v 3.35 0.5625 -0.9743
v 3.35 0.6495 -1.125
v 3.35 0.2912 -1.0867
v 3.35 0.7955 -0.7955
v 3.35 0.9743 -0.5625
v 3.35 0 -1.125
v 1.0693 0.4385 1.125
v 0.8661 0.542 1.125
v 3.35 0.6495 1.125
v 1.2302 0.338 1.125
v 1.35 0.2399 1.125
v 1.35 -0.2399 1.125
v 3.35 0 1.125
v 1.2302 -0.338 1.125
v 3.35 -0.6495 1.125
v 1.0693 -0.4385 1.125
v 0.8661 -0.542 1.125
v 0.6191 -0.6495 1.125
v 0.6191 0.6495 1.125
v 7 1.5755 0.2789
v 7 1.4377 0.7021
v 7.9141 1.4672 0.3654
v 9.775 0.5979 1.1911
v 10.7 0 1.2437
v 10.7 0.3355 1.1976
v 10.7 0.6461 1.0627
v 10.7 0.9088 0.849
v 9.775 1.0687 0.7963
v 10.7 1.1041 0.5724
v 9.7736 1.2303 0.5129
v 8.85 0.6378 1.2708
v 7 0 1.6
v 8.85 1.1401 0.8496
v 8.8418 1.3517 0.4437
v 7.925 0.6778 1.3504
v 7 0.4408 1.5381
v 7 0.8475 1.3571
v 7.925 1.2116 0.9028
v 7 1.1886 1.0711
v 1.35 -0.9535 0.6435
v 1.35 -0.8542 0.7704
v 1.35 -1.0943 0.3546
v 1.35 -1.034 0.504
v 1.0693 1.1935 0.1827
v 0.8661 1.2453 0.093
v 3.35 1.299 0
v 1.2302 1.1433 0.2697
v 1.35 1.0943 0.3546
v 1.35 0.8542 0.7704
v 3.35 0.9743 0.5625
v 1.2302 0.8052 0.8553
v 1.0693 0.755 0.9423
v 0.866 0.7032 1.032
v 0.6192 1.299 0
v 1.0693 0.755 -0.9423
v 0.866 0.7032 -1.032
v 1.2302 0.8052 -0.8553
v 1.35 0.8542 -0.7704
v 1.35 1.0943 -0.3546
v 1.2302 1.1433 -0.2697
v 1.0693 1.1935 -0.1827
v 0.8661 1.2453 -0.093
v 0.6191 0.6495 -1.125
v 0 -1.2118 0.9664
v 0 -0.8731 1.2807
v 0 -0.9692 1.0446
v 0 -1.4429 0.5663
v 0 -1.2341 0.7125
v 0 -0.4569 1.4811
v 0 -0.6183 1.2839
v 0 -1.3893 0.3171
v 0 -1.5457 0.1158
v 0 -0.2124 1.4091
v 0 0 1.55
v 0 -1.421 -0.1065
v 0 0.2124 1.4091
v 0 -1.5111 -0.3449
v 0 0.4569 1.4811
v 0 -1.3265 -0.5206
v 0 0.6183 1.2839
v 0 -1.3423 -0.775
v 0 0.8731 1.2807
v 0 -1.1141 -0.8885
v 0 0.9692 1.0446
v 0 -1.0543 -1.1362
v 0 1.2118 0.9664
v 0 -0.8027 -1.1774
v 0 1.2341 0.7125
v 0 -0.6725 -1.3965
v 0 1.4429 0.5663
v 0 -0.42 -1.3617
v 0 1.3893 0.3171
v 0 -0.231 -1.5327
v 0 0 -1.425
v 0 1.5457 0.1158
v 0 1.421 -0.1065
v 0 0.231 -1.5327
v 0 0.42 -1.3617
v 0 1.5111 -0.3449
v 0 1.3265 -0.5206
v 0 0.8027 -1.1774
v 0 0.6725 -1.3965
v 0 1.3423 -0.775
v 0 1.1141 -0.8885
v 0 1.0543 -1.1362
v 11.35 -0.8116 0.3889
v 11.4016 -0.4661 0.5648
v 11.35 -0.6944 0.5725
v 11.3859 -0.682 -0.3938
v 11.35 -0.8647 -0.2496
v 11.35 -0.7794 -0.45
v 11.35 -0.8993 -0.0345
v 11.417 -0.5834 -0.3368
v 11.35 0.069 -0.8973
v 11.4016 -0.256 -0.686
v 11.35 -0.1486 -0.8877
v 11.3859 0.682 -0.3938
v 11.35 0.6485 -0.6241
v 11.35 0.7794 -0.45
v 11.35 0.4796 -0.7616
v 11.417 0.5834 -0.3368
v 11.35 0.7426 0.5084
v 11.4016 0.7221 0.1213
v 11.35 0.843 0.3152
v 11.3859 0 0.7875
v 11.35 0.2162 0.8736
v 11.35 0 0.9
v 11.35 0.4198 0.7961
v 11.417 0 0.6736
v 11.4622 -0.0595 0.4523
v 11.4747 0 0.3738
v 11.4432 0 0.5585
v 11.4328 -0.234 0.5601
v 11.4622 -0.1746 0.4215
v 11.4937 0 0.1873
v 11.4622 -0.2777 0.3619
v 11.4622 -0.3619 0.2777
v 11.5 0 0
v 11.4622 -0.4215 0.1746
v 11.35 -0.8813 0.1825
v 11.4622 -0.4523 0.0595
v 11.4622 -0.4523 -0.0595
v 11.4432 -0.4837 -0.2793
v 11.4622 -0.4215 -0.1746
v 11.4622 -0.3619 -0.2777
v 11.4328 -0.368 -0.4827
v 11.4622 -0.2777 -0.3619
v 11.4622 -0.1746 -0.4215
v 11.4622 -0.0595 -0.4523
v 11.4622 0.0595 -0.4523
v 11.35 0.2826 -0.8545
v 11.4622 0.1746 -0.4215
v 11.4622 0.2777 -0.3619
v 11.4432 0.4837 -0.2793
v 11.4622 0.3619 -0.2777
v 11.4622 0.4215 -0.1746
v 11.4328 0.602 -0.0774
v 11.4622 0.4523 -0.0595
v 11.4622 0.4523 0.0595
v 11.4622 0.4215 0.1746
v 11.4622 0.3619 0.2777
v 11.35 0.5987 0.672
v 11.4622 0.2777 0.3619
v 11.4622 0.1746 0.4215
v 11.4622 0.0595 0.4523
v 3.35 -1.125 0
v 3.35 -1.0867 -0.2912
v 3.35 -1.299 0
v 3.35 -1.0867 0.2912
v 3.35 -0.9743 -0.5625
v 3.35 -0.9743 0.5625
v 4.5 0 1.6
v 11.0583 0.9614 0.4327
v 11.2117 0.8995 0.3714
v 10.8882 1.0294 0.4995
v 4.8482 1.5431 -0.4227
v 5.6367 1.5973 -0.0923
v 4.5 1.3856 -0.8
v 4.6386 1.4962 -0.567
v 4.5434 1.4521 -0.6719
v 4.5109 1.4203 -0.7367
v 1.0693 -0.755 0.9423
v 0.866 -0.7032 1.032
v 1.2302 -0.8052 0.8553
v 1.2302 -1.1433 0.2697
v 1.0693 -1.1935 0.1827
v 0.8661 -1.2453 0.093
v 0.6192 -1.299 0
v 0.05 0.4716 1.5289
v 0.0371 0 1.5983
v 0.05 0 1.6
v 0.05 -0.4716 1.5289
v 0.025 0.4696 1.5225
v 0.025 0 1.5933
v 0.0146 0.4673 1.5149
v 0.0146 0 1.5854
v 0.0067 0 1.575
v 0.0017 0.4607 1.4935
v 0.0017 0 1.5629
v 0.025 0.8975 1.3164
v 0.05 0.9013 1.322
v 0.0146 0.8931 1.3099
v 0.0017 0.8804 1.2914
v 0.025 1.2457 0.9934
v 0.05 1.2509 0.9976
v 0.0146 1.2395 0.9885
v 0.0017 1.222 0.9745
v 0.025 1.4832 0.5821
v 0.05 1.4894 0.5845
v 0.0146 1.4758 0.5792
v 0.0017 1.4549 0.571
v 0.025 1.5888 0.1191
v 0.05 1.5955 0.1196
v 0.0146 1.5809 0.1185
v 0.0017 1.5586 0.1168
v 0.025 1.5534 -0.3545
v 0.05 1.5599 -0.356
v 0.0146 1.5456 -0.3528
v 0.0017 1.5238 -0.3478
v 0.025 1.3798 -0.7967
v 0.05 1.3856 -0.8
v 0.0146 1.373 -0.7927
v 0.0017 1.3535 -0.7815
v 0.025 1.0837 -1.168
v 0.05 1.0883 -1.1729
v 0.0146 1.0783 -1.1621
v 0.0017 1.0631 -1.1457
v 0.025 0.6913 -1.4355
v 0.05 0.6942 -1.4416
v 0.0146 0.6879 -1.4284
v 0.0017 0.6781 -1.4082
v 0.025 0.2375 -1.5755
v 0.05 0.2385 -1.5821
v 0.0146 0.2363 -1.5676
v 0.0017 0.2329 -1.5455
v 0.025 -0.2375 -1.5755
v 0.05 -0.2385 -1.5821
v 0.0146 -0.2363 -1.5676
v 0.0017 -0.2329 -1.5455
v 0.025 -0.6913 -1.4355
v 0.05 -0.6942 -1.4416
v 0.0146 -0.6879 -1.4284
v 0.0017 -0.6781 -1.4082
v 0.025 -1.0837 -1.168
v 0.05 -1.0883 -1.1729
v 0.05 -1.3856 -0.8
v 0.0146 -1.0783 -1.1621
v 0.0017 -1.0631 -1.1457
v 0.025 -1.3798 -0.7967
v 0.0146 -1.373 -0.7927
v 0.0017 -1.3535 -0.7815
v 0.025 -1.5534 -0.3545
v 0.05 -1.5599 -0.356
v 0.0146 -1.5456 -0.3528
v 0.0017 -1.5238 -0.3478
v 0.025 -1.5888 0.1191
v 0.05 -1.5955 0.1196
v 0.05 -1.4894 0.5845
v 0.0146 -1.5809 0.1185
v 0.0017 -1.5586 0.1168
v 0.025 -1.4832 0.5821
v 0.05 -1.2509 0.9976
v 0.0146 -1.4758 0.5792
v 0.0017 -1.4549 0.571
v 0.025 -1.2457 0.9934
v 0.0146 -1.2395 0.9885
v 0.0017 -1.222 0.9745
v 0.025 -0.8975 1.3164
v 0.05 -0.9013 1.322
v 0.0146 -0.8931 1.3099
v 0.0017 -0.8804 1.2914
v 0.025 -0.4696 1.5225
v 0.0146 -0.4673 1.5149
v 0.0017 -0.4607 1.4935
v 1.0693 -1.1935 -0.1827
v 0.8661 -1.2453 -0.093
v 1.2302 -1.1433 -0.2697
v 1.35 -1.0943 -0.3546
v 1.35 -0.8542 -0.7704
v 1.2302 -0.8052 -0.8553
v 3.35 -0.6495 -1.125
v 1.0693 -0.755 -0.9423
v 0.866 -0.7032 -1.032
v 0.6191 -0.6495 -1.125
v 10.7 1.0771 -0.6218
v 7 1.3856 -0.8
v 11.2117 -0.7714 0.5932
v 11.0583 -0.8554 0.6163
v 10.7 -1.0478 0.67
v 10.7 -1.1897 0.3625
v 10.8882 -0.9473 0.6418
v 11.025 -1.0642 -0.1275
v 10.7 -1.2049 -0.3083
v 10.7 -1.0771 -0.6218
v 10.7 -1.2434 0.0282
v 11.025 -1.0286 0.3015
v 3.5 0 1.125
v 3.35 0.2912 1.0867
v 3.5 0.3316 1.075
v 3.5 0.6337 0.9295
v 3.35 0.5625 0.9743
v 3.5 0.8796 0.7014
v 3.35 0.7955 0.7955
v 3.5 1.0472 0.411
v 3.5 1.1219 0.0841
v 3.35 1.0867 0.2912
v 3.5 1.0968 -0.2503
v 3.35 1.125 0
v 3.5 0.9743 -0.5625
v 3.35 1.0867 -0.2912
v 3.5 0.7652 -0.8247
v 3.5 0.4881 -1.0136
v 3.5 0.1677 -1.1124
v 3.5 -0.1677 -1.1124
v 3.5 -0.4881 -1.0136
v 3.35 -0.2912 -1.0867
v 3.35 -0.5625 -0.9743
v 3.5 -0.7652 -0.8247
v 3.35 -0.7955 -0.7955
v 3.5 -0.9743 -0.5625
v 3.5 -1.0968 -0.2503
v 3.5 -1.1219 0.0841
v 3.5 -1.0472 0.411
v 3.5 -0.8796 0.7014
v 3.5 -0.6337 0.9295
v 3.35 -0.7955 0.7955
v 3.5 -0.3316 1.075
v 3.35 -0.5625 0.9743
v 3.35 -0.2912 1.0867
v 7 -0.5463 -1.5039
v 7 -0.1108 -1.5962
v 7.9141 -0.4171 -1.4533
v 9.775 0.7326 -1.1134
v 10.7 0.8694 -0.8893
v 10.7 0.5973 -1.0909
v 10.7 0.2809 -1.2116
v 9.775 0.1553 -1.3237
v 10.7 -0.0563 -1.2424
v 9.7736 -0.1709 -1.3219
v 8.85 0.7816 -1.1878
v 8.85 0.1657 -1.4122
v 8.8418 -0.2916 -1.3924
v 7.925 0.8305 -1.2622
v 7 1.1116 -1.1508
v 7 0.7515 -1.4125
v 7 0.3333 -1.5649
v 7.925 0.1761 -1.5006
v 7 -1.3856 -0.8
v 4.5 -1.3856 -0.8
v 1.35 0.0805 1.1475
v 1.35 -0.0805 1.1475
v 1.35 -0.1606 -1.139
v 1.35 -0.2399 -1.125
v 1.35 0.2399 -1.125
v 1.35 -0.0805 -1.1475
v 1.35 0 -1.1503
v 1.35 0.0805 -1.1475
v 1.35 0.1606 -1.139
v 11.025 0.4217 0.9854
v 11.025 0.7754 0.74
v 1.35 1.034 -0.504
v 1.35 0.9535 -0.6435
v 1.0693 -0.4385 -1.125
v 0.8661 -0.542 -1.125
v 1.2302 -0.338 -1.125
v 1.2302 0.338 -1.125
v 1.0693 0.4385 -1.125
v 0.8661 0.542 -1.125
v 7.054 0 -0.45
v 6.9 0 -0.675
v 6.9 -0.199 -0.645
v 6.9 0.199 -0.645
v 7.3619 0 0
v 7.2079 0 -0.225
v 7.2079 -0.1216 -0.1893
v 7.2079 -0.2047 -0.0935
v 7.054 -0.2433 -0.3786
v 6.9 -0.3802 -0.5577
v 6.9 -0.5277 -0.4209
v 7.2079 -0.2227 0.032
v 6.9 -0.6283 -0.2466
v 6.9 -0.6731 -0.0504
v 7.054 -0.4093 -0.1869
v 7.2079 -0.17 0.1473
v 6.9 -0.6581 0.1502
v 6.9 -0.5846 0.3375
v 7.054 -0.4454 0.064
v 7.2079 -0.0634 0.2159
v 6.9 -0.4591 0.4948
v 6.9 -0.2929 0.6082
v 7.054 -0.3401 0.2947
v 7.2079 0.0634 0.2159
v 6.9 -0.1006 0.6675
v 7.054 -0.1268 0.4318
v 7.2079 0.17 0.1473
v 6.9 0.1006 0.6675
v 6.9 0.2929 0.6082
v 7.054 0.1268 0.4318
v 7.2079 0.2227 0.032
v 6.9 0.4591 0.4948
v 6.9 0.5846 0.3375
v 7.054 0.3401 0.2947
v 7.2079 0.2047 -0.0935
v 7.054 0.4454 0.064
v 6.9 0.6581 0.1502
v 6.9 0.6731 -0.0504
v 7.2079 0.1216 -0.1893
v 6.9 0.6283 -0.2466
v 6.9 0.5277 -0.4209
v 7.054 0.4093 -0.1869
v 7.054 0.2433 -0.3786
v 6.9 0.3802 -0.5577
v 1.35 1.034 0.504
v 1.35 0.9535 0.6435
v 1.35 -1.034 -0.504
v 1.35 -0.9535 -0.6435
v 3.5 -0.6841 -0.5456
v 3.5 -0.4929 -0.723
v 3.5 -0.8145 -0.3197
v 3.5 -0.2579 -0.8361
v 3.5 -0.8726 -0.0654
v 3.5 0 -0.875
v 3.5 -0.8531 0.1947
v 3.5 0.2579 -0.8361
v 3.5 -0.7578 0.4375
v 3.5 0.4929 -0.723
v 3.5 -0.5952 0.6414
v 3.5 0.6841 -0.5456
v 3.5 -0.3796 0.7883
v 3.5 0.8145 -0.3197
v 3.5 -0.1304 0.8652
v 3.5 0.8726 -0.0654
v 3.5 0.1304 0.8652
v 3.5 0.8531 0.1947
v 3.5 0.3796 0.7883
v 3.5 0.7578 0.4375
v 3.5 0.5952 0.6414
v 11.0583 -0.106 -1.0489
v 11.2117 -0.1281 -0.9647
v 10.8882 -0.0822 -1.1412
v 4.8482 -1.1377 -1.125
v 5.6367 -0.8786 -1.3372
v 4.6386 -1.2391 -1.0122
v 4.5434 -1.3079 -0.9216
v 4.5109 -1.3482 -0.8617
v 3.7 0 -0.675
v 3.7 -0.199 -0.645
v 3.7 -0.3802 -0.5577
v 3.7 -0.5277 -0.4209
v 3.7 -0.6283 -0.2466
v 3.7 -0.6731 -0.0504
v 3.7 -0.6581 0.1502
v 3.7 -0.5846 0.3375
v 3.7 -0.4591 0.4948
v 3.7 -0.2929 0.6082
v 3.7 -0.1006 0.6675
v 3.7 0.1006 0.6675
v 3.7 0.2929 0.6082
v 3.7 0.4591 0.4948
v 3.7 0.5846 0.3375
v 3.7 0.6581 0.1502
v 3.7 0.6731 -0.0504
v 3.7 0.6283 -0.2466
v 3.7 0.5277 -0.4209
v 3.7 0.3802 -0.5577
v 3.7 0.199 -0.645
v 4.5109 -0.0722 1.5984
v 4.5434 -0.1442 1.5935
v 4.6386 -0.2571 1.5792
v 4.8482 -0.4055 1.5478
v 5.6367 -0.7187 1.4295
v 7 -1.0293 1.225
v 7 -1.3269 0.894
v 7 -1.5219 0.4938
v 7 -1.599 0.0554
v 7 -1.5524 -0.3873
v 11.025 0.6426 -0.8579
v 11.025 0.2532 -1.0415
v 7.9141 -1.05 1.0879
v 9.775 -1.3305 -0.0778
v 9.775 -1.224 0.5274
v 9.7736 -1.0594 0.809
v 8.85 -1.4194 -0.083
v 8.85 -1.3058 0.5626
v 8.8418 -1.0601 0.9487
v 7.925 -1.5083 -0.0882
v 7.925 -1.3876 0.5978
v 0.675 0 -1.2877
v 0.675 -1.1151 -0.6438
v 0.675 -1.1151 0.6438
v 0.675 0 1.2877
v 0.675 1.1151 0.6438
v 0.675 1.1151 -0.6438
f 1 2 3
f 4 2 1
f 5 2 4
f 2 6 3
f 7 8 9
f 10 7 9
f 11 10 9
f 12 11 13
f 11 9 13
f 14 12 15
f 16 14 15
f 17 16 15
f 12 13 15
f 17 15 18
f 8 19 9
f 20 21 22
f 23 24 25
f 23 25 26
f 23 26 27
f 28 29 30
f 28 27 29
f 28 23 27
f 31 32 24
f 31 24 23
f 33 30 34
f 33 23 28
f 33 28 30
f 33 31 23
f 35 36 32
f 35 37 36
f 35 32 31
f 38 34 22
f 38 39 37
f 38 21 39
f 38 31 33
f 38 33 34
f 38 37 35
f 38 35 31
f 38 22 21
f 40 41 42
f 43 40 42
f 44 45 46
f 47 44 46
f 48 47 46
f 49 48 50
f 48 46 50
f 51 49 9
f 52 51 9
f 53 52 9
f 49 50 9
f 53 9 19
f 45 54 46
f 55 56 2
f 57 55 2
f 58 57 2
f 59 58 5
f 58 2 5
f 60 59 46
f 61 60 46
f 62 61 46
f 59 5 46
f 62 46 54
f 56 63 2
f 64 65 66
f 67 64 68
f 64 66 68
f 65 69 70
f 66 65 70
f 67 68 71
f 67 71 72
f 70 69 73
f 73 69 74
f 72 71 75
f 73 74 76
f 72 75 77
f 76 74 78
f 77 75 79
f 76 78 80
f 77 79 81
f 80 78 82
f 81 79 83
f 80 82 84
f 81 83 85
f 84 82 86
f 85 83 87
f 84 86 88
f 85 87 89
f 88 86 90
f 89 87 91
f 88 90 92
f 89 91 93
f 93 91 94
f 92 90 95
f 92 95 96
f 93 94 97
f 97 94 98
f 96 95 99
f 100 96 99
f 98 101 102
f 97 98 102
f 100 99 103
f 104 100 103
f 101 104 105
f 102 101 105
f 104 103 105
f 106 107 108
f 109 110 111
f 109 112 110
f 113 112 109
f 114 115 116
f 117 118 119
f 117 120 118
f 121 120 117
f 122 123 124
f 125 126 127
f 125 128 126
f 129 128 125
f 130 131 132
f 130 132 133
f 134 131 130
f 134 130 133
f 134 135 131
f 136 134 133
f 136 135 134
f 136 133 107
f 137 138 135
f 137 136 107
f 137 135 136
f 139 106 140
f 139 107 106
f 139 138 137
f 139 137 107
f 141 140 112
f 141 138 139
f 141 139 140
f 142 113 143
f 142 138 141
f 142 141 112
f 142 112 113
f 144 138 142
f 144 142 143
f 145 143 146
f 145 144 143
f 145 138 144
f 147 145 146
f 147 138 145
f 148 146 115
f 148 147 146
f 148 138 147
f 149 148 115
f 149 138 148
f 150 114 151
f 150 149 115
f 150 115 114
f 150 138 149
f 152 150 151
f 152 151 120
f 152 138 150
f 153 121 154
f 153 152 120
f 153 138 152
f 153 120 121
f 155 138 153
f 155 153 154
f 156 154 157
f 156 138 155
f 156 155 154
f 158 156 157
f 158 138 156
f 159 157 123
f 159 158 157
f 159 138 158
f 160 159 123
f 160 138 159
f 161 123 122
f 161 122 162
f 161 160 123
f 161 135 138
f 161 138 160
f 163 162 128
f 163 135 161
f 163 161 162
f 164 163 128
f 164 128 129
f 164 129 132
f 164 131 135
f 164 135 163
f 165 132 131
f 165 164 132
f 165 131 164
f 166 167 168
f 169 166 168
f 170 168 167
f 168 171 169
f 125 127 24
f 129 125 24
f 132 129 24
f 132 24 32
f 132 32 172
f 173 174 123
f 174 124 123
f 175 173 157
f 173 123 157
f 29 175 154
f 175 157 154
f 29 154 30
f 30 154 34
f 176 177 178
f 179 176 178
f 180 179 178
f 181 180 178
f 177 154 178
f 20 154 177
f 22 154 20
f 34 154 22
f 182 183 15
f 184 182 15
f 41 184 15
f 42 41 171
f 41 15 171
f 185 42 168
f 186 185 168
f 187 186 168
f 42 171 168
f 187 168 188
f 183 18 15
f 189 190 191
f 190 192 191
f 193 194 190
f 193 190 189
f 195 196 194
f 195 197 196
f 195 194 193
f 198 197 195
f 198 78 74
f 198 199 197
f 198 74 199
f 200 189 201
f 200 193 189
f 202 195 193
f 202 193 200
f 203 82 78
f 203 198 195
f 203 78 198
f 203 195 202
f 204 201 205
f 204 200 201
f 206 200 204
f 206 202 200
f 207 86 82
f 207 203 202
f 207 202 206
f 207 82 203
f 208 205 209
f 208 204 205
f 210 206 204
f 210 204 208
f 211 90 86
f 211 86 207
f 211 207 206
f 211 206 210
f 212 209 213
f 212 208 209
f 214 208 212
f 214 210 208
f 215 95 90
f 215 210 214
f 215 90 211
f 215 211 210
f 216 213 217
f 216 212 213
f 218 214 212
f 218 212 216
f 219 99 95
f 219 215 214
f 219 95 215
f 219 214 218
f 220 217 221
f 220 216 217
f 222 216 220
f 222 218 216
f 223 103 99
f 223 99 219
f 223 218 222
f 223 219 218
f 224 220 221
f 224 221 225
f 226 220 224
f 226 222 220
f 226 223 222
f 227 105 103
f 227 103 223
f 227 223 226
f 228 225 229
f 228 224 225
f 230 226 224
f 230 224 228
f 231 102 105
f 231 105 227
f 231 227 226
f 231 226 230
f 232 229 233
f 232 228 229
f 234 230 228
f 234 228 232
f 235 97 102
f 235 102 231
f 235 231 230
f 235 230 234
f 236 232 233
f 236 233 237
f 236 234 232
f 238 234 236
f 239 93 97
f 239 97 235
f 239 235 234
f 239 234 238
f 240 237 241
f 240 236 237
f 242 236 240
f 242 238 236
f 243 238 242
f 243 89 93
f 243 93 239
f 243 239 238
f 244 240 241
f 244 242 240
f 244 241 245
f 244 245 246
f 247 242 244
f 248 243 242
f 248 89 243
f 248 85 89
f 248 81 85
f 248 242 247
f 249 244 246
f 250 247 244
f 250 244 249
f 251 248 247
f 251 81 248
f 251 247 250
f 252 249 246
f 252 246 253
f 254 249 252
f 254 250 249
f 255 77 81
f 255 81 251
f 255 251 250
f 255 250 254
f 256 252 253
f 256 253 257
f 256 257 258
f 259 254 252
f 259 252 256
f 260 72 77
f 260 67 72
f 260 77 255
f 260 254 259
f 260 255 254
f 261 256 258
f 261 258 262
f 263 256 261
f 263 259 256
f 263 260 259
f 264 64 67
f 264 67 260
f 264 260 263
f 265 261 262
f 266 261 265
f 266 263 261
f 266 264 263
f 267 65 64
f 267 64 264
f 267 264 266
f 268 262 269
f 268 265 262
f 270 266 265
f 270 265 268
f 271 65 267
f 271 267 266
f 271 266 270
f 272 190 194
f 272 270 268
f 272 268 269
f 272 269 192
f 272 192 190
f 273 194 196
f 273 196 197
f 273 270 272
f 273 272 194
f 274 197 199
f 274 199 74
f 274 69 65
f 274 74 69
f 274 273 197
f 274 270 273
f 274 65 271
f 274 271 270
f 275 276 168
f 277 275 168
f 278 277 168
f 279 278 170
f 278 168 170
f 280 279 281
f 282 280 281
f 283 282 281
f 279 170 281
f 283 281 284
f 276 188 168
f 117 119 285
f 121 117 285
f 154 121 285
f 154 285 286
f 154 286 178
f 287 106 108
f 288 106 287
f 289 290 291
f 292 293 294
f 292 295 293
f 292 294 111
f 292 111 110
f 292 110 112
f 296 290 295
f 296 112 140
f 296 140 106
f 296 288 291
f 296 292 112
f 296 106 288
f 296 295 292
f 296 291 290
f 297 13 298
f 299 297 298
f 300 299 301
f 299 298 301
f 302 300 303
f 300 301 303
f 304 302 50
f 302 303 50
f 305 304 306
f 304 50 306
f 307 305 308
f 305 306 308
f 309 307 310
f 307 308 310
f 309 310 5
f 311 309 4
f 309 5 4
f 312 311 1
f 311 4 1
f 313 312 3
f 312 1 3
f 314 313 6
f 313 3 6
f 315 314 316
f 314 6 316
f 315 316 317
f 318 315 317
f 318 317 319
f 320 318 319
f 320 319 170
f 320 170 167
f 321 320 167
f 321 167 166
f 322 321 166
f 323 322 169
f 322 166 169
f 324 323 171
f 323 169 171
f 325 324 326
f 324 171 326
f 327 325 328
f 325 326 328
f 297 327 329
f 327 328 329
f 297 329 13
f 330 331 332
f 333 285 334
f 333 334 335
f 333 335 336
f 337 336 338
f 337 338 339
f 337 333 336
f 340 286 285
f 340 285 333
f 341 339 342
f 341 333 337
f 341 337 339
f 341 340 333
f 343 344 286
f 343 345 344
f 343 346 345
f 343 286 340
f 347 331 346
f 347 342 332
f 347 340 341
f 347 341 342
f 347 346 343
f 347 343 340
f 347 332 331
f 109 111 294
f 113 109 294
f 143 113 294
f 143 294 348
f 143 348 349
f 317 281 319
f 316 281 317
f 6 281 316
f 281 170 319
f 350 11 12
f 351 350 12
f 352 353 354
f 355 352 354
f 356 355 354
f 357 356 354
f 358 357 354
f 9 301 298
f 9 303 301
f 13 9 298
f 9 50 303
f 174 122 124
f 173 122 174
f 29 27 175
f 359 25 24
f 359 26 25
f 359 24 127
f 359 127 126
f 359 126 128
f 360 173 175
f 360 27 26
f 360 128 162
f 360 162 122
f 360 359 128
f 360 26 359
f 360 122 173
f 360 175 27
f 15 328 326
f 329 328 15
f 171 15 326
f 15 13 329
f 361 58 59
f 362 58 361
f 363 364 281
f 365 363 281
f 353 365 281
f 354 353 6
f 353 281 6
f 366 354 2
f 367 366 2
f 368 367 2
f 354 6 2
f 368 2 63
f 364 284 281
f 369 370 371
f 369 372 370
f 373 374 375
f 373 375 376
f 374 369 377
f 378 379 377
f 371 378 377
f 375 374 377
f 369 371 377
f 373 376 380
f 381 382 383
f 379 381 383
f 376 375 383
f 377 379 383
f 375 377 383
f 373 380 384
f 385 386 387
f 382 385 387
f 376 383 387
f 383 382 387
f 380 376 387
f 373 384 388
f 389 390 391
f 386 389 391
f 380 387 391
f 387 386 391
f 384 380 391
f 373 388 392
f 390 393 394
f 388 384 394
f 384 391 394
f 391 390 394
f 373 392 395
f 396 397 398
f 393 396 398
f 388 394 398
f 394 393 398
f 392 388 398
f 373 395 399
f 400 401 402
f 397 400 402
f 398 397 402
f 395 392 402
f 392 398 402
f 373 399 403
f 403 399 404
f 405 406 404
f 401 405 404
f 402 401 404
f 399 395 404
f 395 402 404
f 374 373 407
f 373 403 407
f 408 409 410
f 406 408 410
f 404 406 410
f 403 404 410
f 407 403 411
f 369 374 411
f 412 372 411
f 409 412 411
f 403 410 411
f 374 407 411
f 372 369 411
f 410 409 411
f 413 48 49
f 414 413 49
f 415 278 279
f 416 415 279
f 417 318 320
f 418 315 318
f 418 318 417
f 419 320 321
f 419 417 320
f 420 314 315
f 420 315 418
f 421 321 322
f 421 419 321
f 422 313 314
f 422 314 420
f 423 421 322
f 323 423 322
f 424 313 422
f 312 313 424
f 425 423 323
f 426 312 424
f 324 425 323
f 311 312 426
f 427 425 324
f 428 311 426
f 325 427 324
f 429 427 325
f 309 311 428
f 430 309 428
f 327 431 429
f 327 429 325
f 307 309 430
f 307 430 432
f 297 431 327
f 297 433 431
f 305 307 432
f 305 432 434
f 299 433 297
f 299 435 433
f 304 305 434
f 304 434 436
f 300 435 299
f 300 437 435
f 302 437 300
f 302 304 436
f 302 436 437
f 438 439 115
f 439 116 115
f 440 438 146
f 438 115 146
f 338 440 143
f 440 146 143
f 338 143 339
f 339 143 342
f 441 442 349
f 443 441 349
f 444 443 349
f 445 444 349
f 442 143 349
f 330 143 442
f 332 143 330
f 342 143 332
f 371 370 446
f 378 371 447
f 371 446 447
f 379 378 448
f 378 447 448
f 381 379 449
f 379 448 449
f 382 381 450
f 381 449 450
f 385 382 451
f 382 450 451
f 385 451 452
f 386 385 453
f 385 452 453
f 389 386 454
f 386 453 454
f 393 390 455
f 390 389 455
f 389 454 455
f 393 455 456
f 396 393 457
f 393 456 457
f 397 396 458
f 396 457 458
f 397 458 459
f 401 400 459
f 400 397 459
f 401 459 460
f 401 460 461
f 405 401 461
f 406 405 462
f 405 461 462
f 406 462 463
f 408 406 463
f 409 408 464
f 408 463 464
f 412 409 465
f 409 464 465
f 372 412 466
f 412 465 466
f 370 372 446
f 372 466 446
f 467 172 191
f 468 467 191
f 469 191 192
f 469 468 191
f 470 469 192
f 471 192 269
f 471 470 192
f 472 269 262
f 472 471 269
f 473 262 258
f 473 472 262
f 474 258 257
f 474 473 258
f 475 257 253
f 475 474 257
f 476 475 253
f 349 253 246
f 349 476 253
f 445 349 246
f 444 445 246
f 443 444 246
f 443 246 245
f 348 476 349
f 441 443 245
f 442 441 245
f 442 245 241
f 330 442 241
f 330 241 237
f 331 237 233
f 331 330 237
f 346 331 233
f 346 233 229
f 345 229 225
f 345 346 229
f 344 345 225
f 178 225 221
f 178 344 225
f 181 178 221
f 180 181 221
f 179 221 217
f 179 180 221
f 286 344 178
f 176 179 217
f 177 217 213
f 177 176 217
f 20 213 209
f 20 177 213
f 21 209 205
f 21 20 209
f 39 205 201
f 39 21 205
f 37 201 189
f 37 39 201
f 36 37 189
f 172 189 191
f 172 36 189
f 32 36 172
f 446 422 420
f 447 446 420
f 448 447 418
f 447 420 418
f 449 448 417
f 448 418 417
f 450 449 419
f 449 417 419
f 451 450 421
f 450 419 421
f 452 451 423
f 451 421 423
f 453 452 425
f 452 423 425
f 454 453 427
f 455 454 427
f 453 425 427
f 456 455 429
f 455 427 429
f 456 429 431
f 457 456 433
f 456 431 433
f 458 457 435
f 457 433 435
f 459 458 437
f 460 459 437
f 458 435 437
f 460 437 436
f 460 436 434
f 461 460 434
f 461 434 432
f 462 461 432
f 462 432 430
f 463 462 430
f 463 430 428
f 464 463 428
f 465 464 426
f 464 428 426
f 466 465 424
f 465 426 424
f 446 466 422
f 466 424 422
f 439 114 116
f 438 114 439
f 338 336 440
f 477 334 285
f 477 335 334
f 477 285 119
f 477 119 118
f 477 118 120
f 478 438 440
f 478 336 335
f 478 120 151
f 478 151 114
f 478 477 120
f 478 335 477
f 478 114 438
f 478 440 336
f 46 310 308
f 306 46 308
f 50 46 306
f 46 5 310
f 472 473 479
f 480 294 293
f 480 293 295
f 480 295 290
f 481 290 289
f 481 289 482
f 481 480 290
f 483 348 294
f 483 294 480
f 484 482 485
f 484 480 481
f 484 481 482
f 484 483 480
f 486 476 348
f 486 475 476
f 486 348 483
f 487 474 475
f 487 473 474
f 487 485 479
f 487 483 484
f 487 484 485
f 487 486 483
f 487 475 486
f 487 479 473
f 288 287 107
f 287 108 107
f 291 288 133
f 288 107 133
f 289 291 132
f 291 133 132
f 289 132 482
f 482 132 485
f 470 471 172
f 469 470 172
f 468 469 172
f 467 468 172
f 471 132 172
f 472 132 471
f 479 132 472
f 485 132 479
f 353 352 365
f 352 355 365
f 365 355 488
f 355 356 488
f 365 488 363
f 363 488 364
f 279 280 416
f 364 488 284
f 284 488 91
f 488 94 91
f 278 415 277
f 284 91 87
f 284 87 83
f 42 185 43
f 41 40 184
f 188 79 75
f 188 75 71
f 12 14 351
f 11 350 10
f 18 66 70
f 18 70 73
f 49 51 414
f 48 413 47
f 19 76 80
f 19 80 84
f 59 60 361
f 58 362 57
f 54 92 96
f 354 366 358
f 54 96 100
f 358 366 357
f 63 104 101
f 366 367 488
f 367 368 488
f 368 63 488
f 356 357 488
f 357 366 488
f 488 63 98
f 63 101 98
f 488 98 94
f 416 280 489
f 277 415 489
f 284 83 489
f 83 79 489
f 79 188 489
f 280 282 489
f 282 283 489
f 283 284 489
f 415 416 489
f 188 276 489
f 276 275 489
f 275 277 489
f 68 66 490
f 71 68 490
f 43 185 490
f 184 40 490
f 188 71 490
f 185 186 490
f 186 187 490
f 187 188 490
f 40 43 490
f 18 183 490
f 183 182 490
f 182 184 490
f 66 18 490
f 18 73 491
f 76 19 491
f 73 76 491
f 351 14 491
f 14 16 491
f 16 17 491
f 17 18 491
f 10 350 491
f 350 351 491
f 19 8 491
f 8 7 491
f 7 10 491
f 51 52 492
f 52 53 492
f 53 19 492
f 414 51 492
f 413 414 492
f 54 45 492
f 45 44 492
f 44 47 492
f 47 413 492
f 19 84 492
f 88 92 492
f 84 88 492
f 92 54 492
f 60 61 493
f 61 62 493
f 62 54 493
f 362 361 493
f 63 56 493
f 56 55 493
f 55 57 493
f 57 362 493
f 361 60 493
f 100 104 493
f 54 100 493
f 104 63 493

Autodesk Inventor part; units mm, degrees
ref_plane "YZ Plane" through (0, 0, 0) normal (1, 0, 0) x (0, 1, 0)
ref_plane "XZ Plane" through (0, 0, 0) normal (0, 1, 0) x (-1, 0, 0)
ref_plane "XY Plane" through (0, 0, 0) normal (0, 0, 1) x (1, 0, 0)
sketch "Sketch1" plane through (0, 0, 0) normal (0, 1, 0) x (-1, 0, 0)
  line L0 (0, 0) -> (0, 1.6)
  line L1 (0, 1.6) -> (-7, 1.6)
  line L2 (-7, 1.6) -> (-10.7, 1.2437)
  line L3 (-11.2, 0.9793) -> (-11.2, 0)
  line L4 (-11.2, 0) -> (0, 0)
  arc A0 (-11.35, 0.9) -> (-11.5, 0) centre (-8.725, 0) ccw
  line L5 (-11.2, 0) -> (-11.5, 0)
  line L6 (-10.7, 0) -> (-10.7, 1.2437)
  line L7 (-10.7, 1.2437) -> (-11.35, 0.9)
  dimension "d0" = 1.6
  dimension "d1" = 7
  dimension "d3" = 11.2
  dimension "d4" = 0.3
  dimension "d352" = 0.8
  dimension "d353" = 0.9
  dimension "d355" = 0.65
  dimension "d359" = 5.5
revolve "Revolution1" add sketch "Sketch1" angle 360 about axis through (11.2, 0, 0) along (-1, 0, 0)
sketch "Sketch2" plane through (0, 0, 0) normal (0, 1, 0) x (-1, 0, 0)
  line L0 (0, -1.425) -> (0, 0)
  line L1 (0, 0) -> (-6.9, 0)
  line L2 (-6.9, 0) -> (-6.9, -0.675)
  line L3 (-6.9, -0.675) -> (-2.8, -0.675)
  line L4 (-2.8, -0.675) -> (-2.8, -1.1)
  line L5 (-2.8, -1.1) -> (-1.35, -1.1)
  line L6 (-1.35, -1.1) -> (-1.35, -1.1503)
  line L7 (-1.35, -1.1503) -> (0, -1.425)
  line L8 (-6.9, -0.675) -> (-7.3619, 0)
  line L9 (-7.3619, 0) -> (-6.9, 0) construction
  line L10 (-7.3619, 0) -> (-6.9, 0)
  line L11 (0, 0) -> (0, -1.425)
  line L12 (0, -1.6) -> (0, 1.6) projected
  line L13 (0, -1.425) -> (0, -1.425)
  dimension "d9" = 1.1
  dimension "d11" = 1.425
  dimension "d12" = 11.5
  dimension "d145" = 0.4619
  dimension "d284" = 1.45
  dimension "d293" = 1.35
  dimension "d361" = 1.425
  dimension "d363" = 0
  dimension "d367" = 6.9
  dimension "d373" = 0.675
revolve "Revolution2" cut sketch "Sketch2" angle 360 about axis through (0, 0, 0) along (1, 0, 0)
sketch "Sketch3" plane through (1.35, 0, 0) normal (-1, 0, 0) x (0, 0, 1)
  line L0 (0, 1.299) -> (1.125, 0.6495)
  line L1 (1.125, 0.6495) -> (1.125, -0.6495)
  line L2 (1.125, -0.6495) -> (0, -1.299)
  line L3 (0, -1.299) -> (-1.125, -0.6495)
  line L4 (-1.125, -0.6495) -> (-1.125, 0.6495)
  line L5 (-1.125, 0.6495) -> (0, 1.299)
  point P0 (0, 0)
  point P1 (0, 0)
  dimension "d20" = 0
  dimension "d21" = 2.25
extrude "Extrusion1" cut sketch "Sketch3" along normal blind 1.25 and the other way blind 2
fillet "Fillet1" radius 0.05 1 edges at (0, 0, -1.6)
sketch "Sketch10" plane through (0, 0, 0) normal (0, 1, 0) x (-1, 0, 0)
  circle A0 centre (-1.8, 1.5) radius 0.1
  line L0 (-0.5216, -1.4433) -> (-0.46, -1.55)
  line L1 (-0.46, -1.55) -> (-0.6332, -1.55)
  line L2 (-0.6332, -1.55) -> (-0.5716, -1.4433)
  line L3 (-0.5216, -1.4433) -> (-0.5716, -1.4433)
  line L4 (0, 1.55) -> (0, -1.55) projected
  point P0 (0, 0)
  point P1 (-0.5466, -1.5)
  point P2 (-0.5466, -1.4)
  dimension "d69" = 0.2
  dimension "d70" = 1.5
  dimension "d71" = 1.8
  dimension "d232" = 0.15
  dimension "d233" = 0.05
  dimension "d234" = 0.05
  dimension "d235" = 0.46
  dimension "d236" = 1.55
  dimension "d237" = 1.55
sketch "Sketch24" plane through (0, 0, 0) normal (0, 1, 0) x (-1, 0, 0)
  line L0 (-2.0692, 1.4443) -> (-2.5292, 1.4)
  line L1 (-2.5292, 1.4) -> (-3.1116, 2.2165)
  line L2 (-3.1116, 2.2165) -> (-2, 2.3235)
  line L3 (-2, 2.3235) -> (-2.0692, 1.4443)
  line L4 (-0.6191, 1.125) -> (-3.35, 1.125) projected
  line L5 (0, 1.425) -> (0, -1.425) projected
  point P0 (0, 0)
  point P1 (-2.6, -1.125)
  point P2 (-0.2505, -1.125)
  dimension "d167" = 60
  dimension "d170" = 2
  dimension "d171" = 100
  dimension "d357" = 0.8685
  dimension "d358" = 0.46
  dimension "d370" = 1.4
  dimension "d371" = 84.5
coil "Coil12" [suppressed]
coil "Coil16" [suppressed]
sketch "Sketch41" plane through (2.0889, 1.4266, -0.4635) normal (0, -0.309017, -0.9510565) x (1, 0, 0)
  line L0 (0.1155, 0) -> (0.0827, 0.0567) projected
  line L1 (0.0827, 0.0567) -> (0.0327, 0.0567) projected
  line L2 (-0.4173, 0.0567) -> (-0.4673, 0.0567) projected
  line L3 (-0.9173, 0.0567) -> (-0.9673, 0.0567) projected
  line L4 (-1.4173, 0.0567) -> (-1.4673, 0.0567) projected
  line L5 (-1.2173, 2.9433) -> (-1.1673, 2.9433) projected
  line L6 (-0.7173, 2.9433) -> (-0.6673, 2.9433) projected
  line L7 (-0.2173, 2.9433) -> (-0.1673, 2.9433) projected
  arc A0 (-2.0889, 0.05) -> (-2.0389, 0) centre (-2.0389, 0.05) ccw projected
  line L8 (-2.0889, 0.05) -> (-2.0889, 0.15) projected
  line L9 (-2.0889, 0.15) -> (-1.1065, 0.3499) projected
  line L10 (4.8111, 0.7) -> (5.273, 1.5) projected
  line L11 (5.273, 1.5) -> (4.8111, 2.3) projected
  line L12 (-1.1065, 2.6501) -> (-2.0889, 2.85) projected
  line L13 (-2.0889, 2.85) -> (-2.0889, 2.95) projected
  arc A1 (-2.0389, 3) -> (-2.0889, 2.95) centre (-2.0389, 2.95) ccw projected
  line L14 (4.8111, 2.3) -> (0.7111, 2.3) projected
  line L15 (0.7111, 0.7) -> (4.8111, 0.7) projected
  line L16 (0.7111, 2.3) -> (0.7111, 2.6) projected
  line L17 (0.5111, 0.4) -> (0.7111, 0.4) projected
  line L18 (0.7111, 2.6) -> (0.5111, 2.6) projected
  line L19 (0.7111, 0.4) -> (0.7111, 0.7) projected
  line L20 (0, 0) -> (-0.3845, 0) projected
  line L21 (0.0327, 0.0567) -> (0, 0) projected
  line L22 (0.1155, 0) -> (0, 0) projected
  line L23 (0.5111, 0.3499) -> (0.5111, 0.4) projected
  line L24 (0.5111, 2.6) -> (0.5111, 2.6501) projected
  arc A2 (9.2611, 0.6) -> (9.2611, 2.4) centre (6.6361, 1.5) ccw projected
  line L25 (0.5111, 2.6501) -> (-1.1065, 2.6501) projected
  line L26 (4.9111, 0) -> (0.1155, 0) projected
  line L27 (-1.1065, 0.3499) -> (0.5111, 0.3499) projected
  line L28 (9.2611, 0.6) -> (8.6111, 0.3237) projected
  line L29 (8.6111, 0.3237) -> (4.9111, 0) projected
  line L30 (-0.5, 0) -> (-0.8845, 0) projected
  line L31 (-1, 0) -> (-1.3845, 0) projected
  line L32 (-1.5, 0) -> (-2.0389, 0) projected
  line L33 (-2.0389, 3) -> (-1.25, 3) projected
  line L34 (-1.1345, 3) -> (-0.75, 3) projected
  line L35 (-0.6345, 3) -> (-0.25, 3) projected
  line L36 (-0.1345, 3) -> (4.9111, 3) projected
  line L37 (4.9111, 3) -> (8.6111, 2.6763) projected
  line L38 (8.6111, 2.6763) -> (9.2611, 2.4) projected
  point P0 (-2.0889, 1.5)
  point P1 (0.04, 2.55)
  point P2 (0.04, 0.95)
  point P3 (2.4363, -2.336)
  point P4 (2.2646, -2.336)
  point P5 (1.6424, -2.336)
  point P6 (1.4156, -2.336)
  point P7 (0.8485, -2.336)
  point P8 (0.5666, -2.336)
  point P9 (0.14, 0.3317)
  point P10 (0.14, 2.6683)
  point P11 (-0.69, 0)
  point P12 (-0.5168, 0)
  point P13 (-1.15, 0)
  point P14 (0.0554, 3.4951)
  point P15 (0.4369, 3.5)
  point P16 (5.5075, 3.4591)
  point P17 (9.4087, 0.8232)
  point P18 (9.1185, 0.3568)
  point P19 (9.1075, 0.3559)
  point P20 (8.3185, 0.2868)
  point P21 (8.3075, 0.2859)
  point P22 (7.5185, 0.2168)
  point P23 (7.5075, 0.2159)
  point P24 (6.7185, 0.1469)
  point P25 (6.7075, 0.1459)
  point P26 (5.9185, 0.0769)
  point P27 (5.9075, 0.0759)
  point P28 (5.1185, 0.0069)
  point P29 (5.1075, 0.0059)
  point P30 (0, 0.0001)
  point P31 (10.24, 3.1065)
  point P32 (9.9229, 0.3686)
  point P33 (9.8272, 0.361)
  point P34 (9.1222, 0.3055)
  point P35 (9.0317, 0.2984)
  point P36 (8.3215, 0.2425)
  point P37 (8.2362, 0.2358)
  point P38 (7.5207, 0.1795)
  point P39 (7.4407, 0.1732)
  point P40 (6.72, 0.1165)
  point P41 (6.6452, 0.1106)
  point P42 (5.9192, 0.0535)
  point P43 (5.8497, 0.048)
  point P44 (5.1195, 0)
  point P45 (5.0443, 0)
  point P46 (4.2066, 0)
  point P47 (3.5312, 0)
  point P48 (3.3689, 0)
  point P49 (2.7371, 0)
  point P50 (2.5311, 0)
  point P51 (1.943, 0)
  point P52 (1.6934, 0)
  point P53 (1.1489, 0)
  point P54 (0.8557, 0)
  point P55 (10.3292, 3.0438)
  point P56 (10.225, 3.1077)
  point P57 (9.5226, 3.163)
  point P58 (9.4295, 3.1703)
  point P59 (8.7218, 3.226)
  point P60 (8.634, 3.2329)
  point P61 (7.9211, 3.289)
  point P62 (7.8385, 3.2955)
  point P63 (7.1203, 3.352)
  point P64 (7.043, 3.3581)
  point P65 (6.3196, 3.415)
  point P66 (6.2475, 3.4207)
  point P67 (5.5189, 3.4781)
  point P68 (5.4519, 3.4833)
  point P69 (4.7224, 3.5)
  point P70 (4.6255, 3.5)
  point P71 (3.9283, 3.5)
  point P72 (3.7877, 3.5)
  point P73 (3.1342, 3.5)
  point P74 (2.95, 3.5)
  point P75 (2.3401, 3.5)
  point P76 (2.1123, 3.5)
  point P77 (1.5459, 3.5)
  point P78 (1.2745, 3.5)
  point P79 (0.7518, 3.5)
  point P80 (0.4368, 3.5)
  point P81 (0.0559, 3.4961)
  point P82 (-0.0003, 0)
  point P83 (1.2685, 3)
  point P84 (0.6925, 3)
  point P85 (2.1062, 3)
  point P86 (2.9439, 3)
  point P87 (1.4866, 3)
  point P88 (3.7817, 3)
  point P89 (2.2807, 3)
  point P90 (3.0748, 3)
  point P91 (4.6194, 3)
  point P92 (3.8689, 3)
  point P93 (4.6631, 3)
  point P94 (9.3294, 0.7244)
  point P95 (8.9446, 0.4186)
  point P96 (5.4339, 2.9655)
  point P97 (5.461, 2.9636)
  point P98 (6.2339, 2.9095)
  point P99 (6.261, 2.9076)
  point P100 (7.0339, 2.8536)
  point P101 (7.061, 2.8517)
  point P102 (7.8339, 2.7976)
  point P103 (7.861, 2.7957)
  point P104 (8.6339, 2.7417)
  point P105 (8.261, 0.2322)
  point P106 (7.461, 0.1763)
  point P107 (8.2339, 0.2303)
  point P108 (6.661, 0.1203)
  point P109 (7.4339, 0.1744)
  point P110 (5.861, 0.0644)
  point P111 (6.6339, 0.1184)
  point P112 (5.061, 0.0085)
  point P113 (5.8339, 0.0625)
  point P114 (9.0823, 0.491)
  point P115 (-0.7468, 0)
  point P116 (5.0339, 0.0066)
  point P117 (-1.2068, 0)
  point P118 (0.1351, 3)
  point P119 (0.9307, 3)
  point P120 (0.6796, 3)
  point P121 (1.5195, 3)
  point P122 (1.7263, 3)
  point P123 (2.3594, 3)
  point P124 (2.5219, 3)
  point P125 (3.1993, 3)
  point P126 (3.3175, 3)
  point P127 (4.0392, 3)
  point P128 (4.113, 3)
  point P129 (5.6716, 2.9335)
  point P130 (5.7097, 2.9301)
  point P131 (6.4622, 2.8643)
  point P132 (6.5109, 2.86)
  point P133 (7.2527, 2.7951)
  point P134 (7.312, 2.79)
  point P135 (8.0433, 2.726)
  point P136 (8.1131, 2.7199)
  point P137 (8.7927, 2.5991)
  point P138 (8.9225, 2.5439)
  point P139 (9.115, 0.5379)
  point P140 (8.5136, 0.3152)
  point P141 (8.4386, 0.3086)
  point P142 (7.7125, 0.2451)
  point P143 (7.648, 0.2394)
  point P144 (6.9114, 0.175)
  point P145 (6.8574, 0.1703)
  point P146 (6.1103, 0.1049)
  point P147 (6.0669, 0.1011)
  point P148 (5.3092, 0.0348)
  point P149 (5.2763, 0.0319)
  point P150 (4.9086, 3)
  point P151 (4.8791, 3)
extrude "Extrusion19" [suppressed]
sketch "Sketch45" plane through (0, 0, 0) normal (0, 1, 0) x (-1, 0, 0)
  point P0 (0, 0)
sketch "Sketch47" plane through (0, 0, 0) normal (0, 0, 1) x (1, 0, 0)
  line L0 (0, -1.425) -> (0.6191, -1.299) projected
  line L1 (6.9, -0.675) -> (7.3619, 0) projected
  line L2 (7.3619, 0) -> (6.9, 0.675) projected
  line L3 (0.6191, 1.299) -> (0, 1.425) projected
  line L4 (6.9, 0.675) -> (3.35, 0.675) projected
  line L5 (3.35, -0.675) -> (6.9, -0.675) projected
  arc A0 (0, -1.55) -> (0.05, -1.6) centre (0.05, -1.55) ccw projected
  line L6 (0, -1.55) -> (0, -1.425) projected
  line L7 (0, 1.425) -> (0, 1.55) projected
  arc A1 (0.05, 1.6) -> (0, 1.55) centre (0.05, 1.55) ccw projected
  line L8 (10.7, 1.2437) -> (11.35, 0.9) projected
  arc A2 (11.35, -0.9) -> (11.35, 0.9) centre (8.725, 0) ccw projected
  line L9 (11.35, -0.9) -> (10.7, -1.2437) projected
  line L10 (10.7, -1.2437) -> (7, -1.6) projected
  line L11 (7, -1.6) -> (0.05, -1.6) projected
  line L12 (0.05, 1.6) -> (7, 1.6) projected
  line L13 (7, 1.6) -> (10.7, 1.2437) projected
  line L14 (0.6191, -1.299) -> (3.35, -1.299) projected
  line L15 (3.35, -1.299) -> (3.35, -0.675) projected
  line L16 (3.35, 0.675) -> (3.35, 1.299) projected
  line L17 (3.35, 1.299) -> (0.6191, 1.299) projected
  point P0 (0, 0)
  point P1 (7.012, 0)
sketch "Sketch9" plane through (0, 0, 0) normal (0, 1, 0) x (-1, 0, 0)
  line L0 (0, 1.425) -> (0, -1.425) projected
  line L1 (0, -1.6) -> (0, 1.6) projected
  line L2 (-12.5, 1.6) -> (-4.5, 1.6)
  line L3 (-7, 1.6) -> (0, 1.6) projected
  line L4 (-12.5, 1.6) -> (-12.5, 0.4)
  line L5 (-12.5, 0.4) -> (-4.5, 1.6)
  point P0 (0, 0)
  dimension "d257" = 1.2
  dimension "d258" = 4.5
  dimension "d262" = 8
extrude "Extrusion4" cut sketch "Sketch9" against normal blind 2
pattern_circular "Circular Pattern1" count 3 over 360 about axis through (-10, 0, 0) along (1, 0, 0) of "Extrusion4"
sketch "Sketch50" plane through (0, 0, 0) normal (0, 1, 0) x (-1, 0, 0)
  line L0 (-3.35, 0.675) -> (-6.9, 0.675) projected
  line L1 (-6.9, 0.675) -> (-7.3619, 0) projected
  line L2 (-6.9, -0.675) -> (-3.35, -0.675) projected
  arc A0 (-0.05, -1.6) -> (0, -1.55) centre (-0.05, -1.55) ccw projected
  arc A1 (0, 1.55) -> (-0.05, 1.6) centre (-0.05, 1.55) ccw projected
  line L3 (-0.05, -1.6) -> (-7, -1.6) projected
  line L4 (-1.35, -1.1503) -> (0, -1.425) projected
  line L5 (0, -1.425) -> (0, -1.55) projected
  line L6 (0, 1.55) -> (0, 1.425) projected
  line L7 (0, 1.425) -> (-1.35, 1.1503) projected
  line L8 (-7.3619, 0) -> (-6.9, -0.675) projected
  line L9 (-4.5, 1.6) -> (-0.05, 1.6) projected
  line L10 (-11.4432, 0.5585) -> (-4.5, 1.6) projected
  line L11 (-7, -1.6) -> (-10.7, -1.2437) projected
  line L12 (-10.7, -1.2437) -> (-11.35, -0.9) projected
  arc A2 (-11.4432, 0.5585) -> (-11.35, -0.9) centre (-8.725, 0) ccw projected
  arc A3 (-11.35, 0.9) -> (-11.4432, 0.5585) centre (-8.725, 0) ccw projected
  line L13 (-11.35, 0.9) -> (-10.7, 1.2437) projected
  line L14 (-10.7, 1.2437) -> (-7, 1.6) projected
  line L15 (-7, 1.6) -> (-4.5, 1.6) projected
  line L16 (-3.35, 1.125) -> (-3.35, 0.675) projected
  line L17 (-3.35, -0.675) -> (-3.35, -1.125) projected
  line L18 (-3.35, -1.125) -> (-1.35, -1.125) projected
  line L19 (-1.35, -1.125) -> (-1.35, -1.1503) projected
  line L20 (-1.35, 1.1503) -> (-1.35, 1.125) projected
  line L21 (-1.35, 1.125) -> (-3.35, 1.125) projected
  point P0 (0, 0)
  point P1 (-1.4382, 1.75)
  point P2 (-1.495, 1.75)
  point P3 (-1.6682, 1.75)
  point P4 (-6.2041, 1.75)
  point P5 (-11.5804, 0.9405)
  point P6 (-2.2986, 1.75)
  point P7 (-5.8766, -1.75)
  point P8 (-6.6717, -1.75)
  point P9 (-7.4687, -1.7289)
  point P10 (-10.5666, -1.2193)
  point P11 (-10.7, -0.8888)
  point P12 (-3.5, -1.3923)
  point P13 (-4.3, -1.3364)
  point P14 (-5.1, -1.2804)
  point P15 (-5.9, -1.2245)
  point P16 (-6.7, -1.1685)
  point P17 (-7.5, -1.1126)
  point P18 (-2.3, 1.4762)
  point P19 (-3.1, 1.4203)
  point P20 (-3.9, 1.3643)
  point P21 (-4.7, 1.3084)
  point P22 (-5.5, 1.2524)
  point P23 (-6.3, 1.1965)
  point P24 (-7.1, 1.1406)
  point P25 (-7.9, 1.0846)
  point P26 (-8.7, 1.0287)
  point P27 (-6.2532, 1.5)
  point P28 (-3.5, -1.3923)
  point P29 (-7.4513, -1.4231)
  point P30 (-8.2513, -1.3601)
  point P31 (-9.0513, -1.2971)
  point P32 (-8.3929, 1.3781)
sketch "Sketch51" plane through (0, 0, 0) normal (0, 0, 1) x (1, 0, 0)
  line L0 (0, -1.425) -> (0.6191, -1.299) projected
  line L1 (6.9, -0.675) -> (7.3619, 0) projected
  line L2 (7.3619, 0) -> (6.9, 0.675) projected
  line L3 (0.6191, 1.299) -> (0, 1.425) projected
  line L4 (0.05, 1.6) -> (5.9291, 1.6) projected
  line L5 (0, 1.425) -> (0, 1.55) projected
  arc A0 (0.05, 1.6) -> (0, 1.55) centre (0.05, 1.55) ccw projected
  arc A1 (0, -1.55) -> (0.05, -1.6) centre (0.05, -1.55) ccw projected
  line L6 (0, -1.55) -> (0, -1.425) projected
  line L7 (5.9291, 1.6) -> (11.4232, 0.6484) projected
  line L8 (7, -1.6) -> (0.05, -1.6) projected
  arc A2 (11.35, -0.9) -> (11.4232, 0.6484) centre (8.725, 0) ccw projected
  line L9 (11.35, -0.9) -> (10.7, -1.2437) projected
  line L10 (10.7, -1.2437) -> (7, -1.6) projected
  line L11 (3.35, 1.299) -> (0.6191, 1.299) projected
  line L12 (0.6191, -1.299) -> (3.35, -1.299) projected
  line L13 (3.35, -1.299) -> (3.35, -0.675) projected
  line L14 (3.35, -0.675) -> (6.9, -0.675) projected
  line L15 (6.9, 0.675) -> (3.35, 0.675) projected
  line L16 (3.35, 0.675) -> (3.35, 1.299) projected
  point P0 (0, 0)
  point P1 (7.012, 0)
  point P2 (0.7475, 1.75)
  point P3 (0.9775, 1.75)
  point P4 (1.2075, 1.75)
  point P5 (8.1591, 1.2076)
  point P6 (5.2803, 1.75)
  point P7 (6.0754, 1.75)
  point P8 (7.6761, 1.6296)
  point P9 (8.4815, 1.5119)
  point P10 (6.0591, 1.5)
  point P11 (10.1597, -0.9266)
  point P12 (9.6652, -1.2902)
  point P13 (8.8644, -1.3533)
  point P14 (7.2629, -1.4793)
  point P15 (9.3597, -0.9825)
  point P16 (3.3597, 1.4021)
  point P17 (4.1597, 1.3462)
  point P18 (6.5597, 1.1783)
  point P19 (7.3597, 1.1224)
  point P20 (8.1597, 1.0665)
  point P21 (9.7597, 0.9546)
  point P22 (10.5597, 0.8986)
  point P23 (10.9597, -0.8707)
  point P24 (8.5597, -1.0385)
  point P25 (7.7597, -1.0944)
  point P26 (6.9597, -1.1504)
  point P27 (5.3597, -1.2622)
  point P28 (4.5597, -1.3182)
  point P29 (3.7597, -1.3741)
  point P30 (2.9597, -1.4301)
  point P31 (3.3597, 1.4021)
  point P32 (9.6652, -1.2902)
  point P33 (10.5597, 0.8986)
  point P34 (8.9597, 0.8491)
  point P35 (10.5597, 0.7232)
  point P36 (6.5597, 1.038)
  point P37 (2.8826, 1.5)
  point P38 (3.6767, 1.5)
  point P39 (4.4708, 1.5)
  point P40 (5.2498, -1.5)
  point P41 (4.0738, -1.5)
  point P42 (3.2796, -1.5)
sketch "Sketch52" plane through (3.35, 0, 0) normal (-1, 0, 0) x (0, 0, 1)
  circle A0 centre (0, 0) radius 1.125
  point P0 (0, 0)
  dimension "d321" = 2.25
extrude "Extrusion21" cut sketch "Sketch52" against normal blind 0.15
sketch "Sketch53" plane through (0, 0, 0) normal (0, 0, 1) x (1, 0, 0)
  line L0 (2.8, -0.75) -> (3.0165, -0.75)
  line L1 (2.8, -0.75) -> (2.8, -1.125)
  line L2 (2.8, -1.125) -> (3.0165, -0.75)
  line L3 (-2.3285, 0) -> (13.8985, 0) projected
  point P0 (0, 0)
  dimension "d325" = 1.125
  dimension "d326" = 0.75
  dimension "d327" = 60
  dimension "d328" = 2.8
revolve "Revolution7" [suppressed]
thread "Thread3" size "M1.6x0.35" class "6H" standard "ANSI Metric M Profile" length 3.1
sketch "Sketch54" plane through (0, 0, 0) normal (0, 1, 0) x (-1, 0, 0)
  line L0 (-13, 1.19) -> (-13, 0.25)
  line L1 (2.6124, 0) -> (-15.6021, 0) projected
  line L2 (0, 1.425) -> (0, -1.425) projected
  line L3 (-13, 0.25) -> (-12.6579, 1.19)
  line L4 (-12.6579, 1.19) -> (-13, 1.19)
  point P0 (0, 0)
  point P1 (-12.861, 0.9532)
  dimension "d341" = 13
  dimension "d342" = 0.94
  dimension "d343" = 20
  dimension "d344" = 0.25
revolve "Revolution8" cut sketch "Sketch54" angle 360 about axis through (-10, 0, 0) along (1, 0, 0)
sketch "Sketch55" plane through (0.5216, 0, -1.4433) normal (0, 1, 0) x (1, 0, 0)
  line L0 (0.05, 0) -> (0.0827, 0.0567) projected
  line L1 (-0.0327, 0.0567) -> (0.0827, 0.0567) projected
  line L2 (-0.4716, 0.0567) -> (-0.0327, 0.0567) projected
  arc A0 (-0.4716, 0.0567) -> (-0.5216, 0.0067) centre (-0.4716, 0.0067) ccw projected
  line L3 (-0.5216, -0.0933) -> (-0.5216, 0.0067) projected
  line L4 (0.5843, -0.3183) -> (-0.5216, -0.0933) projected
  line L5 (6.3784, -0.6433) -> (2.2784, -0.6433) projected
  line L6 (6.8403, -1.4433) -> (6.3784, -0.6433) projected
  line L7 (6.3784, -2.2433) -> (6.8403, -1.4433) projected
  line L8 (2.2784, -2.2433) -> (6.3784, -2.2433) projected
  line L9 (-0.5216, -2.7933) -> (0.5843, -2.5683) projected
  line L10 (-0.5216, -2.8933) -> (-0.5216, -2.7933) projected
  arc A1 (-0.5216, -2.8933) -> (-0.4716, -2.9433) centre (-0.4716, -2.8933) ccw projected
  line L11 (0.5, 0) -> (0.55, 0) projected
  line L12 (1, 0) -> (1.05, 0) projected
  line L13 (1.5, 0) -> (1.55, 0) projected
  line L14 (1.3, -2.8866) -> (1.25, -2.8866) projected
  line L15 (0.8, -2.8866) -> (0.75, -2.8866) projected
  line L16 (0.3, -2.8866) -> (0.25, -2.8866) projected
  line L17 (0, 0) -> (0.05, 0) projected
  line L18 (-0.0327, 0.0567) -> (0, 0) projected
  line L19 (0.0827, 0.0567) -> (0.4673, 0.0567) projected
  line L20 (10.9407, -1.899) -> (3.9784, -2.9433) projected
  line L21 (0.5827, 0.0567) -> (0.9673, 0.0567) projected
  line L22 (1.0827, 0.0567) -> (1.4673, 0.0567) projected
  line L23 (1.5827, 0.0567) -> (6.4784, 0.0567) projected
  line L24 (0.2173, -2.9433) -> (-0.4716, -2.9433) projected
  line L25 (2.2784, -0.6433) -> (2.2784, -0.3433) projected
  line L26 (2.2784, -0.3433) -> (2.0784, -0.3433) projected
  line L27 (2.0784, -0.3433) -> (2.0784, -0.3183) projected
  line L28 (2.0784, -0.3183) -> (0.5843, -0.3183) projected
  line L29 (0.5843, -2.5683) -> (2.0784, -2.5683) projected
  line L30 (2.0784, -2.5683) -> (2.0784, -2.5433) projected
  line L31 (2.0784, -2.5433) -> (2.2784, -2.5433) projected
  line L32 (2.2784, -2.5433) -> (2.2784, -2.2433) projected
  line L33 (3.9784, -2.9433) -> (1.3327, -2.9433) projected
  line L34 (1.2173, -2.9433) -> (0.8327, -2.9433) projected
  line L35 (0.7173, -2.9433) -> (0.3327, -2.9433) projected
  line L36 (6.4784, 0.0567) -> (10.0076, -0.2521) projected
  line L37 (10.0076, -0.2521) -> (10.4686, -0.3904) projected
  line L38 (10.4686, -0.3904) -> (10.8284, -0.5433) projected
  arc A2 (10.9407, -1.899) -> (10.8284, -0.5433) centre (8.2034, -1.4433) ccw projected
  arc A3 (10.8284, -2.3433) -> (10.9407, -1.899) centre (8.2034, -1.4433) ccw projected
  line L39 (10.8284, -2.3433) -> (10.1784, -2.6196) projected
  line L40 (10.1784, -2.6196) -> (6.4784, -2.9433) projected
  line L41 (6.4784, -2.9433) -> (3.9784, -2.9433) projected
  point P0 (-0.5216, -1.4433)
  point P1 (0.2266, -3.3933)
  point P2 (0.4566, -3.3933)
  point P3 (0.6866, -3.3933)
  point P4 (0.9166, -3.3933)
  point P5 (1.1466, -3.3933)
  point P6 (1.3766, -3.3933)
  point P7 (5.6825, -3.3933)
  point P8 (0.3416, 0.1067)
  point P9 (0.5716, 0.1067)
  point P10 (11.0588, -2.5838)
  point P11 (1.6066, -3.3933)
  point P12 (6.4725, -3.3933)
  point P13 (5.7316, -2.8933)
  point P14 (8.1784, -2.422)
  point P15 (10.6381, -0.5366)
  point P16 (2.9784, -0.001)
  point P17 (9.3784, -0.6222)
  point P18 (7.7297, -0.0332)
  point P19 (8.5297, -0.0962)
  point P20 (7.8713, -2.7714)
  point P21 (6.2784, -2.8933)
extrude "Extrusion22" [suppressed]
sketch "Sketch56" plane through (2.0454, -0.6215, 0.2019) normal (0, -0.309017, -0.9510565) x (1, 0, 0)
  line L0 (-1.1738, 0.7898) -> (-1.1238, 0.7898) projected
  arc A0 (-1.9954, 0.8465) -> (-2.0454, 0.7965) centre (-1.9954, 0.7965) ccw projected
  line L1 (-2.0454, 0.6965) -> (-2.0454, 0.7965) projected
  line L2 (-1.063, 0.4967) -> (-2.0454, 0.6965) projected
  line L3 (4.8546, -1.4535) -> (5.3165, -0.6535) projected
  line L4 (5.3165, -0.6535) -> (4.8546, 0.1465) projected
  line L5 (-2.0454, -2.0035) -> (-1.063, -1.8036) projected
  line L6 (-2.0454, -2.1035) -> (-2.0454, -2.0035) projected
  arc A1 (-2.0454, -2.1035) -> (-1.9954, -2.1535) centre (-1.9954, -2.1035) ccw projected
  line L7 (-0.6738, 0.7898) -> (-0.6238, 0.7898) projected
  line L8 (-0.1738, 0.7898) -> (-0.1238, 0.7898) projected
  line L9 (-0.3738, -2.0968) -> (-0.4238, -2.0968) projected
  line L10 (-0.8738, -2.0968) -> (-0.9238, -2.0968) projected
  line L11 (-1.3738, -2.0968) -> (-1.4238, -2.0968) projected
  line L12 (0.159, -2.1535) -> (0.1262, -2.0968) projected
  line L13 (0.1262, -2.0968) -> (0.0762, -2.0968) projected
  line L14 (-0.091, 0.8465) -> (0.1785, 0.8465) projected
  line L15 (0.0435, -2.1535) -> (-0.341, -2.1535) projected
  line L16 (0.0762, -2.0968) -> (0.0435, -2.1535) projected
  line L17 (0.159, -2.1535) -> (0.0435, -2.1535) projected
  line L18 (0.5763, -2.1535) -> (0.159, -2.1535) projected
  line L19 (-1.4565, -2.1535) -> (-1.9954, -2.1535) projected
  line L20 (0.7546, -1.4535) -> (4.8546, -1.4535) projected
  line L21 (0.7546, 0.1465) -> (0.7546, 0.4465) projected
  line L22 (0.7546, 0.4465) -> (0.5546, 0.4465) projected
  line L23 (0.5546, 0.4465) -> (0.5546, 0.4967) projected
  line L24 (-1.9954, 0.8465) -> (-1.2065, 0.8465) projected
  line L25 (-1.091, 0.8465) -> (-0.7065, 0.8465) projected
  line L26 (-0.591, 0.8465) -> (-0.2065, 0.8465) projected
  line L27 (0.5546, -1.8036) -> (0.5546, -1.7535) projected
  line L28 (0.5546, -1.7535) -> (0.7546, -1.7535) projected
  line L29 (0.7546, -1.7535) -> (0.7546, -1.4535) projected
  line L30 (4.8546, 0.1465) -> (0.7546, 0.1465) projected
  line L31 (0.7231, 0.8465) -> (0.9741, 0.8465) projected
  line L32 (1.563, 0.8465) -> (1.7697, 0.8465) projected
  line L33 (2.4029, 0.8465) -> (2.5653, 0.8465) projected
  line L34 (3.2428, 0.8465) -> (3.3609, 0.8465) projected
  line L35 (4.0827, 0.8465) -> (4.1565, 0.8465) projected
  line L36 (2.1675, -2.1535) -> (1.983, -2.1535) projected
  line L37 (1.3719, -2.1535) -> (1.1431, -2.1535) projected
  line L38 (0.5546, 0.4967) -> (-1.063, 0.4967) projected
  line L39 (4.9226, 0.8465) -> (4.9521, 0.8465) projected
  line L40 (5.7151, 0.78) -> (5.7532, 0.7767) projected
  line L41 (6.5056, 0.7108) -> (6.5543, 0.7066) projected
  line L42 (7.2962, 0.6417) -> (7.3555, 0.6365) projected
  line L43 (8.0868, 0.5725) -> (8.1566, 0.5664) projected
  line L44 (8.8362, 0.4456) -> (8.966, 0.3905) projected
  arc A2 (9.4152, -1.1196) -> (9.3418, 0.1298) centre (6.6796, -0.6535) ccw projected
  line L45 (9.4152, -1.1196) -> (5.6437, -1.6979) projected
  line L46 (5.3826, -1.738) -> (5.0794, -1.7845) projected
  line L47 (4.5773, -1.8615) -> (4.3223, -1.9006) projected
  line L48 (3.772, -1.985) -> (3.5652, -2.0167) projected
  line L49 (2.9667, -2.1084) -> (2.8081, -2.1328) projected
  line L50 (-0.4565, -2.1535) -> (-0.841, -2.1535) projected
  line L51 (-0.9565, -2.1535) -> (-1.341, -2.1535) projected
  line L52 (-1.063, -1.8036) -> (0.5546, -1.8036) projected
  point P0 (-2.0454, -0.6535)
  point P1 (0.3989, 3.4635)
  point P2 (7.9, 3.2589)
  point P3 (2.9371, 3.5)
  point P4 (0.038, 3.4961)
  point P5 (8.3992, 2.4114)
  point P6 (-0.0008, 0.0012)
  point P7 (3.1992, 0.225)
  point P8 (7.465, 0.5622)
  point P9 (6.6601, 0.4594)
  point P10 (5.8552, 0.3565)
  point P11 (5.0502, 0.2537)
  point P12 (4.8225, 0.3444)
  point P13 (7.4574, 0.5612)
  point P14 (6.6533, 0.4585)
  point P15 (5.8491, 0.3557)
  point P16 (5.0449, 0.253)
  point P17 (5.4232, 2.9217)
  point P18 (6.2232, 2.8587)
  point P19 (7.0232, 2.7958)
  point P20 (8.6232, 2.6699)
  point P21 (5.4232, 2.9217)
extrude "Extrusion23" [suppressed]
sketch "Sketch57" plane through (0.6191, -0.6495, -1.125) normal (0, 0, 1) x (1, 0, 0)
  point P0 (-0.6191, 0.6495)
sketch "Sketch58" plane through (2.1282, 0, 1.5) normal (0, -1, 0) x (1, 0, 0)
  line L0 (-0.0634, 0) -> (0.4723, 0) projected
  line L1 (-4.5095, -1.5) -> (12.087, -1.5) projected
  line L2 (-0.0426, -0.0738) -> (-0.0426, 0)
  line L3 (-0.0426, 0) -> (0, 0)
  line L4 (0.401, -0.1) -> (-0.059, -0.0557) projected
  line L5 (0.4723, 0) -> (0.401, -0.1) projected
  line L6 (-0.059, -0.0557) -> (-0.0634, 0) projected
  point P0 (-2.1282, -1.5)
revolve "Revolution9" [suppressed]
thread "Thread5" size "M1.6x0.35" class "6H" standard "ANSI Metric M Profile" length 3
sketch "Sketch59" plane through (2.0648, 0, 1.5) normal (0, -1, 0) x (1, 0, 0)
  line L0 (0, 0) -> (0.5357, 0) projected
  line L1 (0.0044, -0.0557) -> (0, 0) projected
  line L2 (0.4644, -0.1) -> (0.0044, -0.0557) projected
  line L3 (0.5357, 0) -> (0.4644, -0.1) projected
  line L4 (-4.4461, -1.5) -> (12.1504, -1.5) projected
  point P0 (-2.0648, -1.5)
revolve "Revolution10" [suppressed]
chamfer "Chamfer5" [suppressed]
chamfer "Chamfer6" distance 0.2 angle 45 1 edges at (3.5, 0, 0.675)
properties part number "3.5X13 Implant" material "Titanium"
